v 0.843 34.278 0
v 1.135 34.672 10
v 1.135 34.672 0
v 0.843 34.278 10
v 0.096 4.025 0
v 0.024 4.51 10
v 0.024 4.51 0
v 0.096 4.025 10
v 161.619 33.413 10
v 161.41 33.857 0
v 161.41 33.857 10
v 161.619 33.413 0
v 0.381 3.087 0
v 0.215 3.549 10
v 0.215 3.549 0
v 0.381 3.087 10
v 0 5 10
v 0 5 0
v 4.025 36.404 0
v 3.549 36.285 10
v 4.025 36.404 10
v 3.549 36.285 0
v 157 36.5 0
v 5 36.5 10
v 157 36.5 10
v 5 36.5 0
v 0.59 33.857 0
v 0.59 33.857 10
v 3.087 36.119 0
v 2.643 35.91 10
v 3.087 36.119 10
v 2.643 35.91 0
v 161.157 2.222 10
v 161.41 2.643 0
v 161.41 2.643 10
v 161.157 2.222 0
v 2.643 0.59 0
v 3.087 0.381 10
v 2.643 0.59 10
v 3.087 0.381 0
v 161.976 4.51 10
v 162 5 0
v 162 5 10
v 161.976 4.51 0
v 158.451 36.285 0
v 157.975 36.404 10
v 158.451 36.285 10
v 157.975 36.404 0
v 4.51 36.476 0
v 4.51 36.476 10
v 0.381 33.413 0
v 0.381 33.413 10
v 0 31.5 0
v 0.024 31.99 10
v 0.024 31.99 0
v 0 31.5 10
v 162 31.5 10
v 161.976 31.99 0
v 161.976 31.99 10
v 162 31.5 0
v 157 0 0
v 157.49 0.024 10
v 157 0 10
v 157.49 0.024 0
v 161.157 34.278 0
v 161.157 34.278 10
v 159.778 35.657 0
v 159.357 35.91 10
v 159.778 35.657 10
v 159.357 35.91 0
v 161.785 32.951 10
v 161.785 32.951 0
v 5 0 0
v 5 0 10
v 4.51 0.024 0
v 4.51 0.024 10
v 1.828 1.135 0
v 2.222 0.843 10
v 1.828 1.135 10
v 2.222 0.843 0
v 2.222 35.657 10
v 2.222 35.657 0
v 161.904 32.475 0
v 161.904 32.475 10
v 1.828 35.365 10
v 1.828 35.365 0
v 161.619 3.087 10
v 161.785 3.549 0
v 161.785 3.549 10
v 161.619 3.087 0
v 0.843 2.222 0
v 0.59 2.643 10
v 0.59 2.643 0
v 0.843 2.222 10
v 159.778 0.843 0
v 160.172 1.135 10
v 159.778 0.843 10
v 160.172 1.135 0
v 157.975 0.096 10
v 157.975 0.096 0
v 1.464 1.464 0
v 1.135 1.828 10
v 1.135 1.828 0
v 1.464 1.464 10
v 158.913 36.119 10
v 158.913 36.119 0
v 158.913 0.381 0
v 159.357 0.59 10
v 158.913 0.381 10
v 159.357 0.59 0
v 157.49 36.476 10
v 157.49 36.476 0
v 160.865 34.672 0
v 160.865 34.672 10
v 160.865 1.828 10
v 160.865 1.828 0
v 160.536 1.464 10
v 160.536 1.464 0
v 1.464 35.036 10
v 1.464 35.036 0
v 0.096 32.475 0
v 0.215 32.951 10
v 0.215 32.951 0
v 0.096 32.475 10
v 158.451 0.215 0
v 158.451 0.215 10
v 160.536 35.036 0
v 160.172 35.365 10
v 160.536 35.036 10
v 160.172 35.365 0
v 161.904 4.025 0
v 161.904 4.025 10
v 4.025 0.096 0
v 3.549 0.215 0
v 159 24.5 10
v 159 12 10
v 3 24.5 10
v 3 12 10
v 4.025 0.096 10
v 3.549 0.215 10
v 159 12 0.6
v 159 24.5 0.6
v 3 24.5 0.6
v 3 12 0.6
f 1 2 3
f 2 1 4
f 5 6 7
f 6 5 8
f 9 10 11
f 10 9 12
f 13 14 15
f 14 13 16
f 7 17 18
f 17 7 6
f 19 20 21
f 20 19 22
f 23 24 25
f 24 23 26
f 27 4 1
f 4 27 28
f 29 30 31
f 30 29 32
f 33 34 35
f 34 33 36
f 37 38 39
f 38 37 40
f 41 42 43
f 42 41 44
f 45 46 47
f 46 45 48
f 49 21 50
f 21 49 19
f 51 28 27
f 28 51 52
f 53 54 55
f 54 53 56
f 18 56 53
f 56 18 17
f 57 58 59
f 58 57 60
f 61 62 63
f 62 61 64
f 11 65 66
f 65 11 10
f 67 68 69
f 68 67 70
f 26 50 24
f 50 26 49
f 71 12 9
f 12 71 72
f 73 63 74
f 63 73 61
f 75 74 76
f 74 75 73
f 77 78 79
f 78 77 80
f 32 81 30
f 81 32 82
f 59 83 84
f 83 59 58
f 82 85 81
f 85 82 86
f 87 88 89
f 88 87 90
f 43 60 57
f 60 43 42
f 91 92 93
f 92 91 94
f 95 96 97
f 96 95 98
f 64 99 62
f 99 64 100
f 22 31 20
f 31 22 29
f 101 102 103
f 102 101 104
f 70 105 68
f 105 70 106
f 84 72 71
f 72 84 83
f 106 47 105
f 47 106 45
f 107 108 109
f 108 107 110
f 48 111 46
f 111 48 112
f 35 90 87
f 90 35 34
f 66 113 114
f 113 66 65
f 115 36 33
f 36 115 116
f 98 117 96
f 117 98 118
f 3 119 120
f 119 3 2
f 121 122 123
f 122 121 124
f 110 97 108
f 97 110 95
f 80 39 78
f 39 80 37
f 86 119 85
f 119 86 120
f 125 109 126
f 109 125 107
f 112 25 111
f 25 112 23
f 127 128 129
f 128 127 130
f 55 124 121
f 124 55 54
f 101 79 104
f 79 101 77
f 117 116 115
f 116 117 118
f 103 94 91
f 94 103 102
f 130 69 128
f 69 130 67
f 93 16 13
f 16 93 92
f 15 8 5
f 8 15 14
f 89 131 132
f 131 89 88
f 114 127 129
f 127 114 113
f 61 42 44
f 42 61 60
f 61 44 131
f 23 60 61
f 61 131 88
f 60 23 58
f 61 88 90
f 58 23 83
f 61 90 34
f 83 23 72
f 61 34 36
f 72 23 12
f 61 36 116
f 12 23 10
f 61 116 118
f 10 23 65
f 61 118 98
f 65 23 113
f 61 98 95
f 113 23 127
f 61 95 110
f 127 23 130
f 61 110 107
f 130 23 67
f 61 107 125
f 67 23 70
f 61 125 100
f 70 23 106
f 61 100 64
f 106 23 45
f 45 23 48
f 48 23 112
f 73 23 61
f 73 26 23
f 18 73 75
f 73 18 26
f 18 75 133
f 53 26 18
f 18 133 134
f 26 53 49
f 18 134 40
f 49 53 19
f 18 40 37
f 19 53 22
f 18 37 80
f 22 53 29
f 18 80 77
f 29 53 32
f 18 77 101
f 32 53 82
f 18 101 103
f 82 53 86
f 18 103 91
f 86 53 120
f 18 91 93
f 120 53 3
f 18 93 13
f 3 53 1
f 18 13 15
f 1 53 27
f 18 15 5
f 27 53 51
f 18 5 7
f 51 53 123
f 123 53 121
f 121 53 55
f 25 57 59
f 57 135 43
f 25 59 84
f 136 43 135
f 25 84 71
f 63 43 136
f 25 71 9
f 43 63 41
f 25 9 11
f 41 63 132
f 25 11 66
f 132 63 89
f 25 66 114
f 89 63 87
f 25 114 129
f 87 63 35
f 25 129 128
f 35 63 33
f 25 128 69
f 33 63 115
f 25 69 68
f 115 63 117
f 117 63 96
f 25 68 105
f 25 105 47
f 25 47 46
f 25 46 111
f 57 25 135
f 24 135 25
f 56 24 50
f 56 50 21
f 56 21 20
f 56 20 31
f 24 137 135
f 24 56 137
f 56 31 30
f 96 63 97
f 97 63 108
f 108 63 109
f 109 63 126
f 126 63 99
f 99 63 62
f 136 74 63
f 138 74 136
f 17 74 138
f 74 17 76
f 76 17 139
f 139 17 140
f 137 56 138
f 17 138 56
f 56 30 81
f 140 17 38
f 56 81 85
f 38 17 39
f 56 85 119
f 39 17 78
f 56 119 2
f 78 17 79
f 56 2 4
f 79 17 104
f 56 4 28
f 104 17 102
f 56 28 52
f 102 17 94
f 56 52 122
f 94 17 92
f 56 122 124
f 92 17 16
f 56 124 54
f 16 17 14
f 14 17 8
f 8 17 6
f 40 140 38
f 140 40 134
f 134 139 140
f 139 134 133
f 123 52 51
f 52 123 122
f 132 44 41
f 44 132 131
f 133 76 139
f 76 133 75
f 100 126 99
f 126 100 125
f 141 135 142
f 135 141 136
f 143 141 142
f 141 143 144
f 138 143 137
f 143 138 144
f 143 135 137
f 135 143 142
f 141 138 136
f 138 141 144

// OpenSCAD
standFrameThickness = 12.5;
standFrameWidth = 156;
standFrameLift = 0.6;
standHeight = 10;
standSideMargin = 3;
standFrontMargin = 12;
standRoundness = 5;

$fn = $preview ? 32 : 64;

module stand() {
    difference() {
        translate([standRoundness, standRoundness, 0])
        linear_extrude(standHeight)
        hull() {
            translate([0, 0])
            circle(standRoundness);
            
            translate([2 * standSideMargin + standFrameWidth - 2 * standRoundness, 0])
            circle(standRoundness);
            
            translate([0, 2 * standFrontMargin + standFrameThickness - 2 * standRoundness])
            circle(standRoundness);
            
            translate([2 * standSideMargin + standFrameWidth - 2 * standRoundness, 2 * standFrontMargin + standFrameThickness - 2 * standRoundness])
            circle(standRoundness);
        }
        
        translate([standSideMargin, standFrontMargin, standFrameLift])
        cube([standFrameWidth, standFrameThickness, standHeight]);
    }
}

stand();
